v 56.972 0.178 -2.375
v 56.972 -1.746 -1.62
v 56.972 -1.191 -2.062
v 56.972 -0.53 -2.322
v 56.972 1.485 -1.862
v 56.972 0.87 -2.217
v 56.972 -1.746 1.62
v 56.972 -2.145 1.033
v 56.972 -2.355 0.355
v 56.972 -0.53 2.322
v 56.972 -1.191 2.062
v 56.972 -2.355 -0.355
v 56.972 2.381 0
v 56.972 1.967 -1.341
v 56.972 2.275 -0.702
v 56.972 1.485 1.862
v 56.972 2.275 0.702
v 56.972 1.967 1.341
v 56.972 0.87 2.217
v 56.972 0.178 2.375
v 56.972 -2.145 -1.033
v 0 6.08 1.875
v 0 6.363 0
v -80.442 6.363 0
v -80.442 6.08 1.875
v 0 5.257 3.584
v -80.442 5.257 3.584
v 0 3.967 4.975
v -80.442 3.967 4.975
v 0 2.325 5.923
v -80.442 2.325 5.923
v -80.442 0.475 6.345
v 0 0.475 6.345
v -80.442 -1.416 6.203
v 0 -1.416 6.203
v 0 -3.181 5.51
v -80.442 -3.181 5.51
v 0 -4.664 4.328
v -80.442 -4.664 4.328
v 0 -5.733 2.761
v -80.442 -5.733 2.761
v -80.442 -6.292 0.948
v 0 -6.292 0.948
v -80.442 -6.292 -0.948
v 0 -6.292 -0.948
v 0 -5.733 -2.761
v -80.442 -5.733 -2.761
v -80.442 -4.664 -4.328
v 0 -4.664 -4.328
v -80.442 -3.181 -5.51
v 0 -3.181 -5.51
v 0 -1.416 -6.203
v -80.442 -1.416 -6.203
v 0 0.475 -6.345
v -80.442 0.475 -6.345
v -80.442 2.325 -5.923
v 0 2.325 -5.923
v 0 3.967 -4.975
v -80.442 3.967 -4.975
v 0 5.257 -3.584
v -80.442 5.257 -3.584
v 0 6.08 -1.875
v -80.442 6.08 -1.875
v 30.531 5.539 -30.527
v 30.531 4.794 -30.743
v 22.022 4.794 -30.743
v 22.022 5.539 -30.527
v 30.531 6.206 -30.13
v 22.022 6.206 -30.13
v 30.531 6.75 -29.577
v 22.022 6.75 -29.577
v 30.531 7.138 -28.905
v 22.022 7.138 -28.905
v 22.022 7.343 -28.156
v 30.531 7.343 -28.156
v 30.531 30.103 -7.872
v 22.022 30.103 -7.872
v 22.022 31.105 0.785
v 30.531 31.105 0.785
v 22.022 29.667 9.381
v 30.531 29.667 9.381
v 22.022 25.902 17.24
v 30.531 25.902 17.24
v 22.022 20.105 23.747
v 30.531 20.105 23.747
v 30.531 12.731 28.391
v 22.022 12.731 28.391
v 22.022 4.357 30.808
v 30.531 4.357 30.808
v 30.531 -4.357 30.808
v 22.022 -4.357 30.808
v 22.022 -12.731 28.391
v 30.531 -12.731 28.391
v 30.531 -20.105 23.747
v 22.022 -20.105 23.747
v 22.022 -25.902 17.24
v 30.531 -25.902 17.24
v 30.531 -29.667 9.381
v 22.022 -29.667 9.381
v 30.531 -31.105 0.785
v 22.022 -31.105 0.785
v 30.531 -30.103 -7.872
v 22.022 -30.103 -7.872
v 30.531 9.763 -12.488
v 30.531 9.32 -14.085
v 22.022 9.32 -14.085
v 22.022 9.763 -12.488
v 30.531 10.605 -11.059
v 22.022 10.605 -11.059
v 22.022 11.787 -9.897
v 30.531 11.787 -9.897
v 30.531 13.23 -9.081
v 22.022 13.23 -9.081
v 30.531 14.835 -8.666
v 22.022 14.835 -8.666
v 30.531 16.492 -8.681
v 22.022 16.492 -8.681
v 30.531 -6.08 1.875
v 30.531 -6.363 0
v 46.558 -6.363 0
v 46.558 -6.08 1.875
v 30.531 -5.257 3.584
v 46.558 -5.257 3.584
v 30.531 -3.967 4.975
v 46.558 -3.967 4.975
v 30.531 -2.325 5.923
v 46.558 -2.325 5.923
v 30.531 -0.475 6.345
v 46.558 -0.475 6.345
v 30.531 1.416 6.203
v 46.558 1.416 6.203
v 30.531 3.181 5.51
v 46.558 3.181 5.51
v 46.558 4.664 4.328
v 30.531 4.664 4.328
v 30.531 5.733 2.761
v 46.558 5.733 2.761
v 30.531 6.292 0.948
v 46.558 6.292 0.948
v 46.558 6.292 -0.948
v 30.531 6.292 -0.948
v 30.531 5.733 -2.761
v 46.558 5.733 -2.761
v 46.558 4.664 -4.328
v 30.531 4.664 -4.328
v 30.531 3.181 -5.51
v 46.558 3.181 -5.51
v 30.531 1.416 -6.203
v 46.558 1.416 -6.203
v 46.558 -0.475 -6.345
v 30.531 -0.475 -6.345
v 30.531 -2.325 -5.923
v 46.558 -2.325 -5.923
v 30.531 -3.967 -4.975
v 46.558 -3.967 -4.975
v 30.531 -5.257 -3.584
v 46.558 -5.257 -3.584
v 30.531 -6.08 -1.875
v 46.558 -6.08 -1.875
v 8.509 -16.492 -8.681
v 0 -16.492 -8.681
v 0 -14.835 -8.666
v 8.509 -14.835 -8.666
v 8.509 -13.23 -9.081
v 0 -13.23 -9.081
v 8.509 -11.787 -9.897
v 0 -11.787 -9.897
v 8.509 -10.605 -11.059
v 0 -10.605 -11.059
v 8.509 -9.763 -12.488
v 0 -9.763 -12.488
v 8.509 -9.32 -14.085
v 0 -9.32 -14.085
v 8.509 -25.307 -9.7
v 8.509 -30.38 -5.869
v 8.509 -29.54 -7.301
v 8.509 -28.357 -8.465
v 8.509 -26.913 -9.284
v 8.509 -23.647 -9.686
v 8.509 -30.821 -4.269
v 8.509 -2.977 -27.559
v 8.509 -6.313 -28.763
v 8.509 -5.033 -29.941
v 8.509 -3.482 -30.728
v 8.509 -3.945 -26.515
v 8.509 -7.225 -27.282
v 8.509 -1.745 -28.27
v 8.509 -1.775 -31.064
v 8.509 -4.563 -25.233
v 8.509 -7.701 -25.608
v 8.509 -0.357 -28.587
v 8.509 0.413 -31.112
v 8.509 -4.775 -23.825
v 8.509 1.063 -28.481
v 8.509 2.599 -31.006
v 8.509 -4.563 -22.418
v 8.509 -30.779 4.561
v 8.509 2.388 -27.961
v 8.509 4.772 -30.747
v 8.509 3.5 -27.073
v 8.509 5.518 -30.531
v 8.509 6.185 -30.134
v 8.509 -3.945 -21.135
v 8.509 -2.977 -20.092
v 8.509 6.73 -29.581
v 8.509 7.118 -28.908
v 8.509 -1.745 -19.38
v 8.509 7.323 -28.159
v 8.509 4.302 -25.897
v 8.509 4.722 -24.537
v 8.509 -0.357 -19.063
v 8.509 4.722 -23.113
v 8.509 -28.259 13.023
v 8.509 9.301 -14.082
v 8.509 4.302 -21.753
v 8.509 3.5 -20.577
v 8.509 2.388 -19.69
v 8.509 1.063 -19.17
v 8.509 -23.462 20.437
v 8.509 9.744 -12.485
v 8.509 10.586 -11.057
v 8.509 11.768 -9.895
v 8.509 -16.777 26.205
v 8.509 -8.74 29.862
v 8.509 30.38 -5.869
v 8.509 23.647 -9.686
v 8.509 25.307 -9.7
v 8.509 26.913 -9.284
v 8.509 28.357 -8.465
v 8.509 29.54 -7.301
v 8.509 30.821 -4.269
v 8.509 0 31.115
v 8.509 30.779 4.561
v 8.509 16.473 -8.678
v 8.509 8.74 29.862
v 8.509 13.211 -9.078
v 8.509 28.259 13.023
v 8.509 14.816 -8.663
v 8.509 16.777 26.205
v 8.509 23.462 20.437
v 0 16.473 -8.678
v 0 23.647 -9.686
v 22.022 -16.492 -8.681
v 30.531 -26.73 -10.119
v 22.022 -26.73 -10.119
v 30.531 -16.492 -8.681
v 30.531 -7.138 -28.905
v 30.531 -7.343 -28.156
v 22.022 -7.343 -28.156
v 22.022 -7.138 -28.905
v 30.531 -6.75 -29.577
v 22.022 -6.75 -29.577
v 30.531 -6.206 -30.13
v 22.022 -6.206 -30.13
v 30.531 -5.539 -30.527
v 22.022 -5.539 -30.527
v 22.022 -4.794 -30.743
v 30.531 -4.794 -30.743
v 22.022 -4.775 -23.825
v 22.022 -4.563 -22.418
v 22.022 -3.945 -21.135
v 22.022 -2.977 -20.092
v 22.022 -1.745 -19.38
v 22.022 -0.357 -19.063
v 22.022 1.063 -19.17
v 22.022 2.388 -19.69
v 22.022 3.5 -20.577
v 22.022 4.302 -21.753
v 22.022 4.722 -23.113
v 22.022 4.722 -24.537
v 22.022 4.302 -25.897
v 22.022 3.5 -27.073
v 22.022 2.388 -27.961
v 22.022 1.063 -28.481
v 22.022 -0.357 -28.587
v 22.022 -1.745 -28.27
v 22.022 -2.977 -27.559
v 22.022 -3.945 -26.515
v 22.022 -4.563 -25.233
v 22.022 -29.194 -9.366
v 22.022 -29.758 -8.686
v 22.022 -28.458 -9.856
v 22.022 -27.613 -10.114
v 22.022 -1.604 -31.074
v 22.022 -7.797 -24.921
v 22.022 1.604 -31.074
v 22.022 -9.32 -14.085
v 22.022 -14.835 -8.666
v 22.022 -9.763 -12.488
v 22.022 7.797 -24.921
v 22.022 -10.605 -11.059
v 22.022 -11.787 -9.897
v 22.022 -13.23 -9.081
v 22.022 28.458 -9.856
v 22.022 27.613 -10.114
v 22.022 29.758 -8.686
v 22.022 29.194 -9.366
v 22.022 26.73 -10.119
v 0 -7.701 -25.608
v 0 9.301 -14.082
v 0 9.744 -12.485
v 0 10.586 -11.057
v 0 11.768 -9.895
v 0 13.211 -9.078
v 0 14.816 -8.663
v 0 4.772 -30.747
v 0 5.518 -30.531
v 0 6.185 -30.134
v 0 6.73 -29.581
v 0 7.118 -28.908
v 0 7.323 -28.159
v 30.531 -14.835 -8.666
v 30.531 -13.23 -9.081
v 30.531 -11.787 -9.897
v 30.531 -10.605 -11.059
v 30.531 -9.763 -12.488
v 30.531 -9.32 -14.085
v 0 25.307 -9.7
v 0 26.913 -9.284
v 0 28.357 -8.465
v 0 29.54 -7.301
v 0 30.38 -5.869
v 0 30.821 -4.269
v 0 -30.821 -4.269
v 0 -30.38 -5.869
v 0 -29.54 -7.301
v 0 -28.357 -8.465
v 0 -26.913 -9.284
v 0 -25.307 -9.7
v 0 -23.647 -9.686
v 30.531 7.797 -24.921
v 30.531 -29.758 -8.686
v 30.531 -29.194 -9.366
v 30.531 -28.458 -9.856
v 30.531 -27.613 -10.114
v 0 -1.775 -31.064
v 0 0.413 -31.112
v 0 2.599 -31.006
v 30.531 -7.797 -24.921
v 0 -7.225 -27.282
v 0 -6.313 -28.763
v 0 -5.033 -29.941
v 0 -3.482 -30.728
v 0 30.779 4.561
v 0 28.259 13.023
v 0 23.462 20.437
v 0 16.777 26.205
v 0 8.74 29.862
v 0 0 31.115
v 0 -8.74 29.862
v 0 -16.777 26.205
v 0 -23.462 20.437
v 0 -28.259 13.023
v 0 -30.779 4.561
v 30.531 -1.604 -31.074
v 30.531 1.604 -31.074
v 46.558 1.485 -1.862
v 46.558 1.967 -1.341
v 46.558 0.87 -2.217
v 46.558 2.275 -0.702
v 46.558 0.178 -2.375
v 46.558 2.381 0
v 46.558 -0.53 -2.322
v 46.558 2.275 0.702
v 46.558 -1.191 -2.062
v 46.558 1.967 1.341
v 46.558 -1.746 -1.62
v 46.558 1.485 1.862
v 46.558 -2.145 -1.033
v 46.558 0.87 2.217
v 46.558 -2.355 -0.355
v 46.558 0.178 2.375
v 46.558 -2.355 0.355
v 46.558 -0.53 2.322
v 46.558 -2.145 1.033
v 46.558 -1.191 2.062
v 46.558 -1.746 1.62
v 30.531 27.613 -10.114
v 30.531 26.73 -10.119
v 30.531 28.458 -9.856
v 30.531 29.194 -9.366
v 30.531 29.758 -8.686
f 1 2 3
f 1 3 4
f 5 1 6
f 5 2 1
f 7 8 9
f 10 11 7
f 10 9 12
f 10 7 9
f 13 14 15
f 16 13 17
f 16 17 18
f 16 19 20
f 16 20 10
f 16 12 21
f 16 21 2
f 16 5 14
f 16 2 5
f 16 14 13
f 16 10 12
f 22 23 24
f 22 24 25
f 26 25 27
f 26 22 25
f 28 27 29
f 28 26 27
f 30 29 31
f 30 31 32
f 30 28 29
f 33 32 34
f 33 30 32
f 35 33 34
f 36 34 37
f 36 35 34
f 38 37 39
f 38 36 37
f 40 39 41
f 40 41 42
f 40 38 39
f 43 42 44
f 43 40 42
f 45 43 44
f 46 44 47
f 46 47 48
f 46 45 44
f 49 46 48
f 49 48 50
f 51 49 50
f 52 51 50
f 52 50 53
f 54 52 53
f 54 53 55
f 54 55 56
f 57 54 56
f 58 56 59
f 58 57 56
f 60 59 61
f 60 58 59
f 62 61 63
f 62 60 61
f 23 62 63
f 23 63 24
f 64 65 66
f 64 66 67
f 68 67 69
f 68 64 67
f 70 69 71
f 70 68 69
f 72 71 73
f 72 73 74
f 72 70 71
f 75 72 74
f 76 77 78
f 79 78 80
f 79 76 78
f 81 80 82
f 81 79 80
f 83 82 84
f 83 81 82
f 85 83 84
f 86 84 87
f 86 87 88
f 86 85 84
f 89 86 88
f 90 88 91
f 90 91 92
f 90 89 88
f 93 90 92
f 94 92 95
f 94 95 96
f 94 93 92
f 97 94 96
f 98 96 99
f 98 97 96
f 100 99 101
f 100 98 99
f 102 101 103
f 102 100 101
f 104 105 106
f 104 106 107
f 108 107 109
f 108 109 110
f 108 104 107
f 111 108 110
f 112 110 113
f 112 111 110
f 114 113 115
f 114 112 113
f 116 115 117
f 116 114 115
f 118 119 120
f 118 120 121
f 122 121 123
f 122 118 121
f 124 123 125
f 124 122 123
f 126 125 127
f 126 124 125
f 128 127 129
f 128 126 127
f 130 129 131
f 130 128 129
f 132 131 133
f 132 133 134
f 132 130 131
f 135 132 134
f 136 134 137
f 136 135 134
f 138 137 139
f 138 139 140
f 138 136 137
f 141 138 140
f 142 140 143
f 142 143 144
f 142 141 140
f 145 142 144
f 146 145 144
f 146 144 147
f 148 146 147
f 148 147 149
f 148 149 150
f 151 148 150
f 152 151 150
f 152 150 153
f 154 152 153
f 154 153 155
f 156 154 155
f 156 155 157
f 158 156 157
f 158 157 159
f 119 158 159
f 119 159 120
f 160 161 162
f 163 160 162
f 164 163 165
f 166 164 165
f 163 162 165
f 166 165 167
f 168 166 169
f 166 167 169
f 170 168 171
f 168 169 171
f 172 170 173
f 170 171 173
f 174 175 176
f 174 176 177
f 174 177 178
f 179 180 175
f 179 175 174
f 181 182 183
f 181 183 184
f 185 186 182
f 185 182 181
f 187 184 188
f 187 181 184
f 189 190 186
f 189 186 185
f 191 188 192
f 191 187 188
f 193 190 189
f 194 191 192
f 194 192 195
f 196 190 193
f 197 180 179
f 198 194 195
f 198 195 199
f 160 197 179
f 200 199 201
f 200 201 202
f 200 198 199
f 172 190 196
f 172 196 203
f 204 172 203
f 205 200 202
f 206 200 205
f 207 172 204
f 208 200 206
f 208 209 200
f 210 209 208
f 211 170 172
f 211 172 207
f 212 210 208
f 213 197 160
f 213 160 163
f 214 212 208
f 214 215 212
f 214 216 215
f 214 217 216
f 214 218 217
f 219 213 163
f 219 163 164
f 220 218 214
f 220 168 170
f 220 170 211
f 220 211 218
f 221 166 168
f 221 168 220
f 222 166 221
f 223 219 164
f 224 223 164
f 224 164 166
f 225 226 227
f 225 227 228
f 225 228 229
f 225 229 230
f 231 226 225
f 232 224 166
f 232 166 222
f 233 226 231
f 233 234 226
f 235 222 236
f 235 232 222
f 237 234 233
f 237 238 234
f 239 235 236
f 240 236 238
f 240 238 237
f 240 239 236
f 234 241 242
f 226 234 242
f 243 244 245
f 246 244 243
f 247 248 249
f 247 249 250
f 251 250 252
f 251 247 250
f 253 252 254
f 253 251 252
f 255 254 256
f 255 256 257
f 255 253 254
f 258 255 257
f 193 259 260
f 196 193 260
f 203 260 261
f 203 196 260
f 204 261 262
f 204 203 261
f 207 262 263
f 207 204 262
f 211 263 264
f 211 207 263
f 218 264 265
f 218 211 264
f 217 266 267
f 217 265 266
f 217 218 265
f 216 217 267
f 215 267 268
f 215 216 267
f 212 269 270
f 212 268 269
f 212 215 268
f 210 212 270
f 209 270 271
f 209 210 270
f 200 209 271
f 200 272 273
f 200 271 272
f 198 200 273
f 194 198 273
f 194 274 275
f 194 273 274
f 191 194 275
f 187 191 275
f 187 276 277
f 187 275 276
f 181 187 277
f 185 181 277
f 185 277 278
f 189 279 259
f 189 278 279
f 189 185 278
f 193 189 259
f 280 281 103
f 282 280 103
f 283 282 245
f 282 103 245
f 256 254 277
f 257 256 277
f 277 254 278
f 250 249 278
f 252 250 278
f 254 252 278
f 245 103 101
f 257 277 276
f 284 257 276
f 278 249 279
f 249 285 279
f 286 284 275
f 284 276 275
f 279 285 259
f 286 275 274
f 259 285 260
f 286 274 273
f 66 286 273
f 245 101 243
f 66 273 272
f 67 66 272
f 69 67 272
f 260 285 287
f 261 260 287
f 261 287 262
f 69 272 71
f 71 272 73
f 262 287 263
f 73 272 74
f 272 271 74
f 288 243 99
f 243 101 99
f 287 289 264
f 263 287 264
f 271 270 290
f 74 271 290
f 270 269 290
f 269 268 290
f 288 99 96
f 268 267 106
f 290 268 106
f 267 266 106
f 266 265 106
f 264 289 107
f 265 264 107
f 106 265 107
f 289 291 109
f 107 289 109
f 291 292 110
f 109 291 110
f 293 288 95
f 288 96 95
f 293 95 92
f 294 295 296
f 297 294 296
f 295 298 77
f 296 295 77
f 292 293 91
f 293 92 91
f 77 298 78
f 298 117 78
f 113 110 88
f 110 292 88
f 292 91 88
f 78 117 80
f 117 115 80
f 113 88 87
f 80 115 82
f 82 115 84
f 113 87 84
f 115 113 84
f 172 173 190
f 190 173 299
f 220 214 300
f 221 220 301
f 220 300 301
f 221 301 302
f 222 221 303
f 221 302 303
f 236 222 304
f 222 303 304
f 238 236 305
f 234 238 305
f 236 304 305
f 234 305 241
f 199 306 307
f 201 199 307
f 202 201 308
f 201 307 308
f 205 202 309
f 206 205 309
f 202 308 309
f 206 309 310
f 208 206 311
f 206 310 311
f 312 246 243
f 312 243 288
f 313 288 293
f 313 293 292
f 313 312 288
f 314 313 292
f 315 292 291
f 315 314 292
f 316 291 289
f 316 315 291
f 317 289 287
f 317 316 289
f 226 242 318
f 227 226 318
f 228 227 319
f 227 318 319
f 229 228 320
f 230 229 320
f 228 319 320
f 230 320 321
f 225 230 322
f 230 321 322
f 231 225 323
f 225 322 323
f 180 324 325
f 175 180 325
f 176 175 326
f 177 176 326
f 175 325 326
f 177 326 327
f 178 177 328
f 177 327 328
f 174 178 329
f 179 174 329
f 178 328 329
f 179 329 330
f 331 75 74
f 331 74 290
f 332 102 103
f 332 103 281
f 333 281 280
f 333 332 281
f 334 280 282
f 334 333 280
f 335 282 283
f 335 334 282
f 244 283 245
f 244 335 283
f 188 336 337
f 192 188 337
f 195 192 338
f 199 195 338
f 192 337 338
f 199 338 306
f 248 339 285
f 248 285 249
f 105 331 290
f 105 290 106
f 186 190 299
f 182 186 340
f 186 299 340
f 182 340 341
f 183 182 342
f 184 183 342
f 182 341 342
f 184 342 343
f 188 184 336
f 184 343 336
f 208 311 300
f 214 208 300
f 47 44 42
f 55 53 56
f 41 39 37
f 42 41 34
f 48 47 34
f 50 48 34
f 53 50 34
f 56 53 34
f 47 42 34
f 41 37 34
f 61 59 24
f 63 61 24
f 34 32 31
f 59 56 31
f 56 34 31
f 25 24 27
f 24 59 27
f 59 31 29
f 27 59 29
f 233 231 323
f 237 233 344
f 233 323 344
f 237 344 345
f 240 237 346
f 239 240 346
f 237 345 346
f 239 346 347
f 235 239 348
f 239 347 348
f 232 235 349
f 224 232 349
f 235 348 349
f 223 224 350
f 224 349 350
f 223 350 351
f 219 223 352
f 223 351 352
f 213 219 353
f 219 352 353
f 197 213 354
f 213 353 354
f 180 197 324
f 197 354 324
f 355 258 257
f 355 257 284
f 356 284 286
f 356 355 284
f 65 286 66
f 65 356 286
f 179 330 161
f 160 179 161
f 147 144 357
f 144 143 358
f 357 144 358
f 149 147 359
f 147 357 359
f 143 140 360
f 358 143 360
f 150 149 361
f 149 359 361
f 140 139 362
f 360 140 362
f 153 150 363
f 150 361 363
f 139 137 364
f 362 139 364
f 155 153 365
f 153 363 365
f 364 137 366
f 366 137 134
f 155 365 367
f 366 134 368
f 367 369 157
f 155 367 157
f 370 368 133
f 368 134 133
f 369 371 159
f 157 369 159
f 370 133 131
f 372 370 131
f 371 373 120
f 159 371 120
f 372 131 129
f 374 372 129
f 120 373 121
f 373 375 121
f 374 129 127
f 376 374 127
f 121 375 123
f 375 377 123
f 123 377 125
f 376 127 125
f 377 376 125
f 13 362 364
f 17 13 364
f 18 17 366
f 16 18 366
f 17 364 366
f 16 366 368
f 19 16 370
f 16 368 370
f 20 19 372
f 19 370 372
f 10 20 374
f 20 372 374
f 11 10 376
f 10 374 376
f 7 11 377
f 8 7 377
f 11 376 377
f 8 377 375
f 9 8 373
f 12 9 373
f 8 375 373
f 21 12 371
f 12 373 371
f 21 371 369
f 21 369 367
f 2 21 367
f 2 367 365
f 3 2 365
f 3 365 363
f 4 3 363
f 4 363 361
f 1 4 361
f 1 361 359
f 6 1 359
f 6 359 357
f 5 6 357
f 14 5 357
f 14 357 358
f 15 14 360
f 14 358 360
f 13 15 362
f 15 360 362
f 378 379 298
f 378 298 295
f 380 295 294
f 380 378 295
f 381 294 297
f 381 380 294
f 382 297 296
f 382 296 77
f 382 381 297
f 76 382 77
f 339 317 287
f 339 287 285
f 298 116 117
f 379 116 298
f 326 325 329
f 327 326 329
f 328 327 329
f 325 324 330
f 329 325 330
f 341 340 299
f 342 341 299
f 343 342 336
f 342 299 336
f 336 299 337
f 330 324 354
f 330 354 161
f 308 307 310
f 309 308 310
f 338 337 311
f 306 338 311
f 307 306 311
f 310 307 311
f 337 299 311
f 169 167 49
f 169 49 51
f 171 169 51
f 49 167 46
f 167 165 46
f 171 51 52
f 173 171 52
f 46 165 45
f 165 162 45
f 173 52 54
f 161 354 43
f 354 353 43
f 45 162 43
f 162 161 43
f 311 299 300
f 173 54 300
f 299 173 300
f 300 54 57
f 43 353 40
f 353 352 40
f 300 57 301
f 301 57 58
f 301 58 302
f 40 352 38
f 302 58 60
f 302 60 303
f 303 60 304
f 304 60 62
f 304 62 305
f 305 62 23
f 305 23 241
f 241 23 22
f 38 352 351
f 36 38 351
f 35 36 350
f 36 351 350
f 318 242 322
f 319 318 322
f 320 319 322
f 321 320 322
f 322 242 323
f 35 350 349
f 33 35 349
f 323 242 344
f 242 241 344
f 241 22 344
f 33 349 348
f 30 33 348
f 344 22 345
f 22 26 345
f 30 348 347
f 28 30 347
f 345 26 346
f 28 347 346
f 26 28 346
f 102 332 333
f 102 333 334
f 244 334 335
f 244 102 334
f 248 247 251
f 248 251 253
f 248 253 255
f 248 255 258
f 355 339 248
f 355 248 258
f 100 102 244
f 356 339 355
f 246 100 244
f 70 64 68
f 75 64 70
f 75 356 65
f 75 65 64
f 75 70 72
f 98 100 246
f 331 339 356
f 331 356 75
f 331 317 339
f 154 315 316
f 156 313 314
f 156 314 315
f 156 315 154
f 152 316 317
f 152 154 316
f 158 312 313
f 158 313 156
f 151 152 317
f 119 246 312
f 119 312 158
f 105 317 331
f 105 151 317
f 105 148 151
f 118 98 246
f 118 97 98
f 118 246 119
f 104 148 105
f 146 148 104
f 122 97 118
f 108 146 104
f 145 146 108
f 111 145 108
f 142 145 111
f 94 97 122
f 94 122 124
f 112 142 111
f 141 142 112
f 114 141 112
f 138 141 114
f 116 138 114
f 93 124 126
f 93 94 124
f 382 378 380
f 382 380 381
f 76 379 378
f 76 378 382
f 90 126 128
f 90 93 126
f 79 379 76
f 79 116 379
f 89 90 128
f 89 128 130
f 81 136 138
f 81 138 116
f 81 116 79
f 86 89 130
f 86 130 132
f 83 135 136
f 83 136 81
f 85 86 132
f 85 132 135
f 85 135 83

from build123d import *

# Parameters (mm, degrees)
F0_R      = 4.7752
F0_R_2    = 6.3627
F1_DEPTH  = 8.509
F2_DEPTH  = 80.4418
F3_R      = 4.7752
F4_DEPTH  = 30.5308
F5_R      = 4.7752
F5_R_2    = 6.3627
F6_DEPTH  = 8.509
F7_R      = 6.3627
F8_DEPTH  = 24.5364
F9_R      = 2.38125
F10_DEPTH = 10.414


with BuildPart() as f1:
    # F0 (on Right) → F1 (new body)
    with BuildSketch(Plane.YZ):
        with BuildLine():
            ThreePointArc((-7.700766, -25.608431), (-5.713574, -29.396277), (-1.774759, -31.064344))
            ThreePointArc((-1.774759, -31.064344), (1.50712, -31.078478), (4.772233, -30.746854))
            ThreePointArc((4.772233, -30.746854), (6.475424, -29.874653), (7.323086, -28.159117))
            Line((7.323086, -28.159117), (9.301448, -14.082338))
            ThreePointArc((9.301448, -14.082338), (11.768125, -9.894752), (16.473399, -8.677885))
            Line((16.473399, -8.677885), (23.647041, -9.686075))
            ThreePointArc((23.647041, -9.686075), (28.357354, -8.465408), (30.820737, -4.269122))
            ThreePointArc((30.820737, -4.269122), (0, 31.115), (-30.820737, -4.269122))
            ThreePointArc((-30.820737, -4.269122), (-28.357354, -8.465408), (-23.647041, -9.686075))
            Line((-23.647041, -9.686075), (-16.492232, -8.680532))
            ThreePointArc((-16.492232, -8.680532), (-11.786957, -9.897399), (-9.32028, -14.084985))
            Line((-9.32028, -14.084985), (-7.700766, -25.608431))
        make_face()
        with Locations((0, -23.8252)):
            Circle(F0_R, mode=Mode.SUBTRACT)
        Circle(F0_R_2, mode=Mode.SUBTRACT)
        Circle(F0_R_2)
    extrude(amount=F1_DEPTH)

    # F0 (on Right) → F2 (join)
    with BuildSketch(Plane.YZ):
        Circle(F0_R_2)
    extrude(amount=-F2_DEPTH)

    # F3 (on face) → F4 (join)
    with BuildSketch(Plane(origin=(0, 0, 0), x_dir=(0, -1, 0), z_dir=(-1, 0, 0))):
        with Locations((0, -23.8252)):
            Circle(F3_R)
    extrude(amount=-F4_DEPTH)

    # F5 (on face) → F6 (join)
    with BuildSketch(Plane.YZ.offset(30.5308)):
        with BuildLine():
            ThreePointArc((26.729671, -10.11931), (28.843815, -9.637583), (30.102707, -7.87212))
            ThreePointArc((30.102707, -7.87212), (0, 31.115), (-30.102707, -7.87212))
            ThreePointArc((-30.102707, -7.87212), (-28.843815, -9.637583), (-26.729671, -10.11931))
            Line((-26.729671, -10.11931), (-16.492232, -8.680532))
            ThreePointArc((-16.492232, -8.680532), (-11.786957, -9.897399), (-9.32028, -14.084985))
            Line((-9.32028, -14.084985), (-7.797371, -24.921049))
            Line((-7.797371, -24.921049), (-7.342719, -28.156062))
            ThreePointArc((-7.342719, -28.156062), (-6.495815, -29.87083), (-4.793998, -30.743468))
            ThreePointArc((-4.793998, -30.743468), (0, -31.115), (4.793998, -30.743468))
            ThreePointArc((4.793998, -30.743468), (6.495815, -29.87083), (7.342719, -28.156062))
            Line((7.342719, -28.156062), (7.797371, -24.921049))
            Line((7.797371, -24.921049), (9.32028, -14.084985))
            ThreePointArc((9.32028, -14.084985), (11.786957, -9.897399), (16.492232, -8.680532))
            Line((16.492232, -8.680532), (26.729671, -10.11931))
        make_face()
        with Locations((0, -23.8252)):
            Circle(F5_R, mode=Mode.SUBTRACT)
        Circle(F5_R_2, mode=Mode.SUBTRACT)
    extrude(amount=-F6_DEPTH)

    # F7 (on face) → F8 (join)
    with BuildSketch(Plane(origin=(22.0218, 0, 0), x_dir=(0, -1, 0), z_dir=(-1, 0, 0))):
        Circle(F7_R)
    extrude(amount=-F8_DEPTH)

    # F9 (on face) → F10 (join)
    with BuildSketch(Plane.YZ.offset(46.5582)):
        Circle(F9_R)
    extrude(amount=F10_DEPTH)


solid = f1.part
